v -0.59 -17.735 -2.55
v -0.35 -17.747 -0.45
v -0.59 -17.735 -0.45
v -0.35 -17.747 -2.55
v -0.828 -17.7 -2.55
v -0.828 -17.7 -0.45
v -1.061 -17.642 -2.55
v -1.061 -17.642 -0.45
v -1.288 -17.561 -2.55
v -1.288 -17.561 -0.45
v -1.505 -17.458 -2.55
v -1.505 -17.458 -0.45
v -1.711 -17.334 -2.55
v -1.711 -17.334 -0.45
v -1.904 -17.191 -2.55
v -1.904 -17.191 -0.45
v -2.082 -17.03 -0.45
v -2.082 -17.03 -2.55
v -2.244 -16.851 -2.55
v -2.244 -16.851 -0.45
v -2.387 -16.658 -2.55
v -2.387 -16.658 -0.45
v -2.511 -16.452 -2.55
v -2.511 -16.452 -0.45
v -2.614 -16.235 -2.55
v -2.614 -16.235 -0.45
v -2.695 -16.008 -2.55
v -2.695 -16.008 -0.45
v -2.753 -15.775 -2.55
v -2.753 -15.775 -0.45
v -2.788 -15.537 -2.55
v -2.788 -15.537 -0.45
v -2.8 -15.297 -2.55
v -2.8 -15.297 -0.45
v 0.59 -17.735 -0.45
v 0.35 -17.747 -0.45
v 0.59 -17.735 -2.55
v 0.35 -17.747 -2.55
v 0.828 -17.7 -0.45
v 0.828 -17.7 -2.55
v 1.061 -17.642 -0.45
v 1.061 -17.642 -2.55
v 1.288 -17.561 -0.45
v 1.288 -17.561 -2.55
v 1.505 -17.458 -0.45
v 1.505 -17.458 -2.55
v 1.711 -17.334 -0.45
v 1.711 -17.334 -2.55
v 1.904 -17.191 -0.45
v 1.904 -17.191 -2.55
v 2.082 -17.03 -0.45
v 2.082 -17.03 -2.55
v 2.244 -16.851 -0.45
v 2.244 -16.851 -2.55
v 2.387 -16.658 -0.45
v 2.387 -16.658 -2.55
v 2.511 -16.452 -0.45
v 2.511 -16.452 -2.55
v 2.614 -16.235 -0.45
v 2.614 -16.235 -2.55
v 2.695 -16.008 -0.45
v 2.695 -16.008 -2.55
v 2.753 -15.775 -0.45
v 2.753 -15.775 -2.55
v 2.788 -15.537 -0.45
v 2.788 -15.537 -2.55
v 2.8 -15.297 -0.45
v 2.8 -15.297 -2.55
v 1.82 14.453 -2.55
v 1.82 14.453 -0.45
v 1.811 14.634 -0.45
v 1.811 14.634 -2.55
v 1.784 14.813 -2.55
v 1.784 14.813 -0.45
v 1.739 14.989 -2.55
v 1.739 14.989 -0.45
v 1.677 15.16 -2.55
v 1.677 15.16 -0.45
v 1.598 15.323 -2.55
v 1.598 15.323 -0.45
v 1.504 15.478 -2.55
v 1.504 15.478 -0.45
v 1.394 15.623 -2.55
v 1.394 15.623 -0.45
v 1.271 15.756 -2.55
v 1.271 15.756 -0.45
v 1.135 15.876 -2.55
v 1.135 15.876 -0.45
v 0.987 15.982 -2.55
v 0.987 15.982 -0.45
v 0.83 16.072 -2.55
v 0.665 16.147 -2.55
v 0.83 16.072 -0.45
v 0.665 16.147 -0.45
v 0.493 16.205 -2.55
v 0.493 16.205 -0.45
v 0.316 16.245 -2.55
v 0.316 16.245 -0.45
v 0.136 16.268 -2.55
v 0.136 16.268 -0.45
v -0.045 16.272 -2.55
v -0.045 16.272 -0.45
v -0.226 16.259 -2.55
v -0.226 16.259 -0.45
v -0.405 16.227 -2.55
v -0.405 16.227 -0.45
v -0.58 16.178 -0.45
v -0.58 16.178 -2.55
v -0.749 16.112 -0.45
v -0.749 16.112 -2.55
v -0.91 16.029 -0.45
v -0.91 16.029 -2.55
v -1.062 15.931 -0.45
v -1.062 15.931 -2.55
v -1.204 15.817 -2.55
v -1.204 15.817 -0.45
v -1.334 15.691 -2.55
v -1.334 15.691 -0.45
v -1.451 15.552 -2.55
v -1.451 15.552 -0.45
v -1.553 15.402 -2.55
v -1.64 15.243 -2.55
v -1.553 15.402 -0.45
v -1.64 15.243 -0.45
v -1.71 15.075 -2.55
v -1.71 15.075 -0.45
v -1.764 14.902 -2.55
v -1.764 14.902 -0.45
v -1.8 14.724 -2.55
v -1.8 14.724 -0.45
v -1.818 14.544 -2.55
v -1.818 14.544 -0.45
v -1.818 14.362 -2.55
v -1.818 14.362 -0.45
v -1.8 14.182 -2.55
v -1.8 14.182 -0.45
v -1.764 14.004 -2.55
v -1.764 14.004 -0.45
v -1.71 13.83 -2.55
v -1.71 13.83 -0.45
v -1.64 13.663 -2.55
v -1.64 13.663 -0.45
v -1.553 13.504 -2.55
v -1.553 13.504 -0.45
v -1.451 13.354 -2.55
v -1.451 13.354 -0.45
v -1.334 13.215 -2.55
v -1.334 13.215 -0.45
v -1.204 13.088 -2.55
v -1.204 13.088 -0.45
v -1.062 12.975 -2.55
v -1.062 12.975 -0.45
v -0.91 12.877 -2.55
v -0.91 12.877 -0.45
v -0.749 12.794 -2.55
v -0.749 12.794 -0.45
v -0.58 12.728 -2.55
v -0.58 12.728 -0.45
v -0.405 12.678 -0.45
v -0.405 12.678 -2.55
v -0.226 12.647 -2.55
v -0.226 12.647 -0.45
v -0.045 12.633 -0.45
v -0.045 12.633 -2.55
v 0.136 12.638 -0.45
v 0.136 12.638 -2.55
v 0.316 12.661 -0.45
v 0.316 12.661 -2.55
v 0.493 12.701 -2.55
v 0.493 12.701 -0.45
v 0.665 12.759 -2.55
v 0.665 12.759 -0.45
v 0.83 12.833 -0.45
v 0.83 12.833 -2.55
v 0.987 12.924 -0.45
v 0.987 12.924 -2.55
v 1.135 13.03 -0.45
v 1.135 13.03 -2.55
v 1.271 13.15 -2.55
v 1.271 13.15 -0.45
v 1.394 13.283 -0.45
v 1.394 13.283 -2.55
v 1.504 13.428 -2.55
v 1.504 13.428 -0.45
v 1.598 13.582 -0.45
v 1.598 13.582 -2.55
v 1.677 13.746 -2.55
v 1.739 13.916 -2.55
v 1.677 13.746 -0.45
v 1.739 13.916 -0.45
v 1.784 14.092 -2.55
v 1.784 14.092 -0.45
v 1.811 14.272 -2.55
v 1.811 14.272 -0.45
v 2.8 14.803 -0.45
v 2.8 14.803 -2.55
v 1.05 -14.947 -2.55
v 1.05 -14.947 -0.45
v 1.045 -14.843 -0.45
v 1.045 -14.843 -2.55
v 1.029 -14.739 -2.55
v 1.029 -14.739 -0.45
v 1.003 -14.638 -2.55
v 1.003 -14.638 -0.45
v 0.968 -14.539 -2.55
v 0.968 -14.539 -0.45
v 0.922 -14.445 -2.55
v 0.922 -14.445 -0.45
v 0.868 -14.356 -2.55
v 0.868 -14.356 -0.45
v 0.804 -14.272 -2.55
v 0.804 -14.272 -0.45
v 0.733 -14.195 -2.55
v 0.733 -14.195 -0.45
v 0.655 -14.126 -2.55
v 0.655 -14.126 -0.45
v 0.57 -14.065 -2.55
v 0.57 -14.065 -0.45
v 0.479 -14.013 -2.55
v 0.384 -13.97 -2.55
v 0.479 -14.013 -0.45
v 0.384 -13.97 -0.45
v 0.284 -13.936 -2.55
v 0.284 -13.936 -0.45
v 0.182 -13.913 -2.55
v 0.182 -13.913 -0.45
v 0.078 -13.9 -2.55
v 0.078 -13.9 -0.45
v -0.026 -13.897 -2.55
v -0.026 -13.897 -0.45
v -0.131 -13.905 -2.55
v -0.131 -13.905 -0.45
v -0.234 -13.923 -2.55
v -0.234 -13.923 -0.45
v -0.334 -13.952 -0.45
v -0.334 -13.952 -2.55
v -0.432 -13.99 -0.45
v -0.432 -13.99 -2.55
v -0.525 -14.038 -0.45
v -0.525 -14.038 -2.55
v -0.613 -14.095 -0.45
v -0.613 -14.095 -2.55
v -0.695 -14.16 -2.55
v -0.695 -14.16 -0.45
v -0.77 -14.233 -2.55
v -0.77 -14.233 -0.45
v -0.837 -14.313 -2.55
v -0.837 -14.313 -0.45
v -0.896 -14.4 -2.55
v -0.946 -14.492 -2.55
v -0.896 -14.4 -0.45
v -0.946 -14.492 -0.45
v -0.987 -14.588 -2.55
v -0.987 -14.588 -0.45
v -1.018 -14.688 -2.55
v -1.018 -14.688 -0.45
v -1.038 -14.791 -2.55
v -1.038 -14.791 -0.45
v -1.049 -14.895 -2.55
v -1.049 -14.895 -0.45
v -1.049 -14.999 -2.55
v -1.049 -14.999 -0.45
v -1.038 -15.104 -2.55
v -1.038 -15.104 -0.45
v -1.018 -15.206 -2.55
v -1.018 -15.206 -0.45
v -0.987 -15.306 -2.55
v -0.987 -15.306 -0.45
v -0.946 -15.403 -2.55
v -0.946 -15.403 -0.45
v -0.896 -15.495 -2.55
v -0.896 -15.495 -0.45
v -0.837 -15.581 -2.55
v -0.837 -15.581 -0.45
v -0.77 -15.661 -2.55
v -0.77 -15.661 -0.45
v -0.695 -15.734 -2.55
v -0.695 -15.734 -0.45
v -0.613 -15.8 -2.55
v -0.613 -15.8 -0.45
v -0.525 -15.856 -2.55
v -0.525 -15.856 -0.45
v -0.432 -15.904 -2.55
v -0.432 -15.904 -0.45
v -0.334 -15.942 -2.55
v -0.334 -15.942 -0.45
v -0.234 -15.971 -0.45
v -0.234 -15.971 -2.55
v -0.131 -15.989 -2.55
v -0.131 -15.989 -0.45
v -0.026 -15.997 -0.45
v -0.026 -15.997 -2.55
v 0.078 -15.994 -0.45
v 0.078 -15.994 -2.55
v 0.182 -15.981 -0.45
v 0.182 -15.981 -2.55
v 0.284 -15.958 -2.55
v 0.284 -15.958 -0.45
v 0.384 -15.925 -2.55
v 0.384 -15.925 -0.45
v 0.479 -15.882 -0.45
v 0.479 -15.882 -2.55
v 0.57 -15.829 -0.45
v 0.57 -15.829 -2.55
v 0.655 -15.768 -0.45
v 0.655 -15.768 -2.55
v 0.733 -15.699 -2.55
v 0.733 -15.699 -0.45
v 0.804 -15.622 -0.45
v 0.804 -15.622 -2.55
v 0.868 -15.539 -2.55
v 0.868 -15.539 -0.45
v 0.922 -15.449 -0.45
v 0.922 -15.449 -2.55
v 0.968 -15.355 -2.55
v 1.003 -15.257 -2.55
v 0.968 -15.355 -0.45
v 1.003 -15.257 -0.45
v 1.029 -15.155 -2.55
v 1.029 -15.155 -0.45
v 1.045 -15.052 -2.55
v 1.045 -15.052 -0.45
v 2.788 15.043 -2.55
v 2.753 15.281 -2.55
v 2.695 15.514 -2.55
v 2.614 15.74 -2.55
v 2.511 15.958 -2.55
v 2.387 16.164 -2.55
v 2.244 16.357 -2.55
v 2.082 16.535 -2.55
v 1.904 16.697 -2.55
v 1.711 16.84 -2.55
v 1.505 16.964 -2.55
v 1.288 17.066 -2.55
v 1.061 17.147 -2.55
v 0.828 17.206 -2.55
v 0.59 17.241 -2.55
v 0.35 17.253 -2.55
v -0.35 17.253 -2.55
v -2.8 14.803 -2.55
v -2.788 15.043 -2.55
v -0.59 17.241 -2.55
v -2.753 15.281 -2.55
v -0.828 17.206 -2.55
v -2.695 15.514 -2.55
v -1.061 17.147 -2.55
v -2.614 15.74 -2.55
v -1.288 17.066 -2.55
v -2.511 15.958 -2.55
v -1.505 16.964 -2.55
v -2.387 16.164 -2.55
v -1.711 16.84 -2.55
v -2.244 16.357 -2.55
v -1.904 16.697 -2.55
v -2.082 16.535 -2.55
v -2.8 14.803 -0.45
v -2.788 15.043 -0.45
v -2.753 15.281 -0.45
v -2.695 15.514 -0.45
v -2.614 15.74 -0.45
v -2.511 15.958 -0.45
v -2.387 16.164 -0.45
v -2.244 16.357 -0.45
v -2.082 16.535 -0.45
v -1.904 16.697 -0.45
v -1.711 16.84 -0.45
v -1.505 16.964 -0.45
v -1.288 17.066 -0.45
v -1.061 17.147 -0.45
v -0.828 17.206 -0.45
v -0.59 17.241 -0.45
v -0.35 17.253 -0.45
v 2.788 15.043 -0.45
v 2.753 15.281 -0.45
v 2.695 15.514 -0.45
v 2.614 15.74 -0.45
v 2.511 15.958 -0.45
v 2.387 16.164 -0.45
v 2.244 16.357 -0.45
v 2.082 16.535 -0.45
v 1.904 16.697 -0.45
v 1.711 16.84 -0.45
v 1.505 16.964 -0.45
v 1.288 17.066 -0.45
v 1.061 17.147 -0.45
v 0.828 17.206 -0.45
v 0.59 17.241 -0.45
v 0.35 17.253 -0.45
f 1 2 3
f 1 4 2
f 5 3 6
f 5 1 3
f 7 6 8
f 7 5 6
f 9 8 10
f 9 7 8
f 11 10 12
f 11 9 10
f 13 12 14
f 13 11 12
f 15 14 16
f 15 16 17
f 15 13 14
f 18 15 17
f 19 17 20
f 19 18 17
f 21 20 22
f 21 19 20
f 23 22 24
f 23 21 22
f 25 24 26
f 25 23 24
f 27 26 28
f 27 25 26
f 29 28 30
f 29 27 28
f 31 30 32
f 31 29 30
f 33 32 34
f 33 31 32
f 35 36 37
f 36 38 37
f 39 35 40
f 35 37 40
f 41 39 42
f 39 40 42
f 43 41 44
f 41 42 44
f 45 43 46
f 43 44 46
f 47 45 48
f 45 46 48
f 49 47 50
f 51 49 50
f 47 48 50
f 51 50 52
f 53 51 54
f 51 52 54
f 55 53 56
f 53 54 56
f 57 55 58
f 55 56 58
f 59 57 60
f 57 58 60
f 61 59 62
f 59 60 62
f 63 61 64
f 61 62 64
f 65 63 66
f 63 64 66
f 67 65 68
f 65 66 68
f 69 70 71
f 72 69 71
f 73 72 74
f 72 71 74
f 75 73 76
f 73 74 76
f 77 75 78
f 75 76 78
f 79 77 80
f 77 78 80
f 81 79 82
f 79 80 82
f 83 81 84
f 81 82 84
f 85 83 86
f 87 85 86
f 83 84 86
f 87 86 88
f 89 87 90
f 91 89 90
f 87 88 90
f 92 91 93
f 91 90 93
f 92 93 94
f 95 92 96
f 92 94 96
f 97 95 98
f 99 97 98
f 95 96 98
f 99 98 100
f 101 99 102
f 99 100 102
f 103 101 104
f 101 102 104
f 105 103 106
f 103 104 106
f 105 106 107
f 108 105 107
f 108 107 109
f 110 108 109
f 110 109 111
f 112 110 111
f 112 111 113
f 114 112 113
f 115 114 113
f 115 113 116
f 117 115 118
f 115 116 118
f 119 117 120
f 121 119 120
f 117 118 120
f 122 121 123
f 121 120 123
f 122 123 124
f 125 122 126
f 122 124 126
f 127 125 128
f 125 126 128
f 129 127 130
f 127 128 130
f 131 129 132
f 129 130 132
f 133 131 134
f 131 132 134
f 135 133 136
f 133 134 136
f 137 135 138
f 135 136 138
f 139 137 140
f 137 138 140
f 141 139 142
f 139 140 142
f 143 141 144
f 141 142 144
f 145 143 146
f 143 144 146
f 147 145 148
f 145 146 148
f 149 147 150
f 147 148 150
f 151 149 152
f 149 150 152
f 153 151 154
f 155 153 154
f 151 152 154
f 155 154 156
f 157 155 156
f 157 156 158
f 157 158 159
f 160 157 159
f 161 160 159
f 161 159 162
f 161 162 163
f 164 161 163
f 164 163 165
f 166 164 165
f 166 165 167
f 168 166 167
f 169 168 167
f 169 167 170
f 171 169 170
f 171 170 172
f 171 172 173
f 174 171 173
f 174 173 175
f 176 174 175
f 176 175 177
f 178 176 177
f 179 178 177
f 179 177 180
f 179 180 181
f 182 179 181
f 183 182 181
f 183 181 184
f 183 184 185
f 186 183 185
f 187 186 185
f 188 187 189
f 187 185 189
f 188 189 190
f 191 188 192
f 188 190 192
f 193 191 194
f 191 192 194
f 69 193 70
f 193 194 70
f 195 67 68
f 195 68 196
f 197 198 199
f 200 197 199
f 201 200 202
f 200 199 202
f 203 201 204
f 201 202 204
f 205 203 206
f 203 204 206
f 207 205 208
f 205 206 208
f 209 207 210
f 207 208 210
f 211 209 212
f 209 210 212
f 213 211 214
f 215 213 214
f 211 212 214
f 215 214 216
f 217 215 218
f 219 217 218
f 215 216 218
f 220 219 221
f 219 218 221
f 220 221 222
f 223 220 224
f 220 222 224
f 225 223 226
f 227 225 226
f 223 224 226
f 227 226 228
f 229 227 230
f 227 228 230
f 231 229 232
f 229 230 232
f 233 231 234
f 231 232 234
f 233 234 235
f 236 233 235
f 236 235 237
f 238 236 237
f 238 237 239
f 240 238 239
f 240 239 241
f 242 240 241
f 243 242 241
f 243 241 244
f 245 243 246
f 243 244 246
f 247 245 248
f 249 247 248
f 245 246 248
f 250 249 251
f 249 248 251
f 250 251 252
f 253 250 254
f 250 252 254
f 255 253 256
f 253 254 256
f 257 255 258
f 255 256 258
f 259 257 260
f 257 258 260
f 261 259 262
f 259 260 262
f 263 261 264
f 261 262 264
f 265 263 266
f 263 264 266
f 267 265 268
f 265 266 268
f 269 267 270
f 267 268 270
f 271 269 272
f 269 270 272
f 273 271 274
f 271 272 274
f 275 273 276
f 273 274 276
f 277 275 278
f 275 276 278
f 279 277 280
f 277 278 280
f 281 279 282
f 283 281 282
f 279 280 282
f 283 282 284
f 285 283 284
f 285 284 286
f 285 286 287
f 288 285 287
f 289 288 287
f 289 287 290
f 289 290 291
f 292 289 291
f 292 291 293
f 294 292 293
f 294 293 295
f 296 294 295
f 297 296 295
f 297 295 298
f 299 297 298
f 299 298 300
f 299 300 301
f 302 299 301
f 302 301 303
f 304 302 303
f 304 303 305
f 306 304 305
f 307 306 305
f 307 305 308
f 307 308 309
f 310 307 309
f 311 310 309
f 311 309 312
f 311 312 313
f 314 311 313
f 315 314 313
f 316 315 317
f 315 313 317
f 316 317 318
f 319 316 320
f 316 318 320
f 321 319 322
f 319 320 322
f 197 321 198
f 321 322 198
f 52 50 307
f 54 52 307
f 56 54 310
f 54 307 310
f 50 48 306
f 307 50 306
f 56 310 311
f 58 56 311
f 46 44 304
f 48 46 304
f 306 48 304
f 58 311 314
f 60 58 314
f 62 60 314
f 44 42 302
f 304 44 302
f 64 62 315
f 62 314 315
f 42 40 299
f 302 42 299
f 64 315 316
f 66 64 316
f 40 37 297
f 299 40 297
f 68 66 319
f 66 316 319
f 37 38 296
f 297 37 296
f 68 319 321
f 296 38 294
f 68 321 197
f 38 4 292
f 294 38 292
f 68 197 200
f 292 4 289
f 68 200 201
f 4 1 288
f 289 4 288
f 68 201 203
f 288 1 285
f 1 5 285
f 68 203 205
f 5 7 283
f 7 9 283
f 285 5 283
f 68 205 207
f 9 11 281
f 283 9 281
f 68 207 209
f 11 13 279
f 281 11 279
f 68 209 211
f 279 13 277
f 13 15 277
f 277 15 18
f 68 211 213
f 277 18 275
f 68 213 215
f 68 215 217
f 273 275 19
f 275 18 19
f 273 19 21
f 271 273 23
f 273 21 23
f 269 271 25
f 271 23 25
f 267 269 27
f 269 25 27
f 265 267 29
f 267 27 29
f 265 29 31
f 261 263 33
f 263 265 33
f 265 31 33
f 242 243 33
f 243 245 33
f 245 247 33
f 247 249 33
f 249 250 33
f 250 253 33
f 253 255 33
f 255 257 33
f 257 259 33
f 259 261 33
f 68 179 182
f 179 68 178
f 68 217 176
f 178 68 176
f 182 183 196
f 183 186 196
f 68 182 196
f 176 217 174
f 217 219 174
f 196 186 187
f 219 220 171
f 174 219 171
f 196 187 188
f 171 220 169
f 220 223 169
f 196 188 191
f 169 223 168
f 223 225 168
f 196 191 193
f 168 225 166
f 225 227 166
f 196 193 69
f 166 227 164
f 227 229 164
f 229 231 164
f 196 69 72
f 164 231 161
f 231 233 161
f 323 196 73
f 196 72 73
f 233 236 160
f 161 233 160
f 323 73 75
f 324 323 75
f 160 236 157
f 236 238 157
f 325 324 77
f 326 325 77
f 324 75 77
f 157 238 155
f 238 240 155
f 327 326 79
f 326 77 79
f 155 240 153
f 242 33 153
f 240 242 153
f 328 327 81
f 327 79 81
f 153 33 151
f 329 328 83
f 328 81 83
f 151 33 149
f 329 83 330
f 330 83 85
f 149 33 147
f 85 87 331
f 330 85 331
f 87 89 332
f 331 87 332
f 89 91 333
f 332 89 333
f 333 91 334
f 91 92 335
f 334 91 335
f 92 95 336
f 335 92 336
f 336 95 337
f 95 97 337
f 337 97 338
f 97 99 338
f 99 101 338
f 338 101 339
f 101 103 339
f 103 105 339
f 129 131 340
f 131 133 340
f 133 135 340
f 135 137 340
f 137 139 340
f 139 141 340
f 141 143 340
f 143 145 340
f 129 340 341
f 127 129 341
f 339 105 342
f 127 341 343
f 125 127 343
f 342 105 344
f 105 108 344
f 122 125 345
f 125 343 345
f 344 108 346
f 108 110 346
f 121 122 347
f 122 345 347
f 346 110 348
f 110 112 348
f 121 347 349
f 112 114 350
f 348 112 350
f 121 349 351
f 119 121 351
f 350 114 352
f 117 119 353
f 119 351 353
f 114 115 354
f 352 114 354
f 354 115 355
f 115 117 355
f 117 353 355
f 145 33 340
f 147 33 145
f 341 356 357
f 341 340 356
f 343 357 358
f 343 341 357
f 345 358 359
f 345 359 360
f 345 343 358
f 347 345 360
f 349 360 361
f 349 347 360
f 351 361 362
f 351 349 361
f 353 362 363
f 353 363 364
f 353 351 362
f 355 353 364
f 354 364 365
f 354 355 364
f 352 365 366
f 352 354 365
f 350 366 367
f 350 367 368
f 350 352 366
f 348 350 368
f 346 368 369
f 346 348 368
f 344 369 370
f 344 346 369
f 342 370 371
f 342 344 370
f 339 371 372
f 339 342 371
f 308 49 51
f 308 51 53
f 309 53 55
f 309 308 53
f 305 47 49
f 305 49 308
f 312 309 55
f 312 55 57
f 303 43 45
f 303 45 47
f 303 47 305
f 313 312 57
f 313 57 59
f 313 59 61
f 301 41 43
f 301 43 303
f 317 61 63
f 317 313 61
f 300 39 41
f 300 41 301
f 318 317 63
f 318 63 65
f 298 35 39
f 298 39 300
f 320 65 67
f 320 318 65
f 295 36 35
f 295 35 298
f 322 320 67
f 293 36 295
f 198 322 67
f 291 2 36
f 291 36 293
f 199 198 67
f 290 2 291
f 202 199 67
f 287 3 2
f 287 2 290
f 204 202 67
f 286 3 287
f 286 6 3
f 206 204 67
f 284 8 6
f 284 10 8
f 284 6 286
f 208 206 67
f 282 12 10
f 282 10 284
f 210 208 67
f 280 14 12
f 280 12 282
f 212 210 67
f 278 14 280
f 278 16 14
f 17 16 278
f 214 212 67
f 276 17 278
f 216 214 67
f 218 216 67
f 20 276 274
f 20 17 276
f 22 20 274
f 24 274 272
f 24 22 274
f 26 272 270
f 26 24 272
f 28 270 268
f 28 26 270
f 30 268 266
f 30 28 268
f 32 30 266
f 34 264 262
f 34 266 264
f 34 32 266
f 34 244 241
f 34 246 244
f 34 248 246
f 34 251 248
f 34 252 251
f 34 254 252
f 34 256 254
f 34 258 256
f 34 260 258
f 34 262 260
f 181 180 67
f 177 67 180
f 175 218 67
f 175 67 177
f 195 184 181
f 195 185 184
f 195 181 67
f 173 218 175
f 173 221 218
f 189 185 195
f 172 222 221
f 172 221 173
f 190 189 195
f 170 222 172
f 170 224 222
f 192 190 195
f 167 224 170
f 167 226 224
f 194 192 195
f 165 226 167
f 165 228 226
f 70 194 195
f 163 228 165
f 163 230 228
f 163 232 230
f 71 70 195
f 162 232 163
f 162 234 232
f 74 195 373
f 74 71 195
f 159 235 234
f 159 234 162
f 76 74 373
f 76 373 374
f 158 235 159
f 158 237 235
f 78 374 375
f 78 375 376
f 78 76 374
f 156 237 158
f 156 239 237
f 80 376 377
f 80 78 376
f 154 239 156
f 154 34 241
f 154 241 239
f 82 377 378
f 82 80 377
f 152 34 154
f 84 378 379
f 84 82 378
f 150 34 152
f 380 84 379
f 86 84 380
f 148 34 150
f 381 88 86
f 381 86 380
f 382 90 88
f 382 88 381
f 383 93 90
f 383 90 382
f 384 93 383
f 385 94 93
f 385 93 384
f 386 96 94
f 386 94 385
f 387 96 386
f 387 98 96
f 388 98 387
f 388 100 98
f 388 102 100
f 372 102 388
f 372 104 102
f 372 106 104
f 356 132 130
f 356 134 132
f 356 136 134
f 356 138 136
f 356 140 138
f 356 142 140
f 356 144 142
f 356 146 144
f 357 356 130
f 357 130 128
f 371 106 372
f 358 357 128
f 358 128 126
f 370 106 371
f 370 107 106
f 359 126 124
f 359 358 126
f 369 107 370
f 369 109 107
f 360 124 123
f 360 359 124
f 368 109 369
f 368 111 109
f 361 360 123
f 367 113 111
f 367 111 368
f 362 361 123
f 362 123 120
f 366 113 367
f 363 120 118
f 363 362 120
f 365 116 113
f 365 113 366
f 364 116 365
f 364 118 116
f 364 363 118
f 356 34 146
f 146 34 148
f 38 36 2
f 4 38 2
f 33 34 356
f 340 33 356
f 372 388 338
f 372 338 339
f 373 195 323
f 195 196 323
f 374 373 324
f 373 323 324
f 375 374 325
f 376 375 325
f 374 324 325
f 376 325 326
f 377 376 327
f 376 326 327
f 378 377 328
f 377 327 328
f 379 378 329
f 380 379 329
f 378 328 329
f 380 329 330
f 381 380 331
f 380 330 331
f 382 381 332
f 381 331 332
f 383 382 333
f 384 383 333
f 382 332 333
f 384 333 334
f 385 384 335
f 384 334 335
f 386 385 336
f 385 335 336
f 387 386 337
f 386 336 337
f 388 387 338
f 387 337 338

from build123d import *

# Parameters (mm, degrees)
SKETCH1_W           = 50
SKETCH1_H           = 8
SKETCH1_R           = 1.5
SKETCH1_R_2         = 2.6
BOSS_EXTRUDE1_DEPTH = 3
FILLET1_R           = 3.5
SCALE1_SCALE        = 0.7


with BuildPart() as part:
    # Sketch1 → Boss-Extrude1 (new body)
    with BuildSketch(Plane(origin=(0, 0, 0), x_dir=(0, 1, 0), z_dir=(0, 0, 1))):
        Rectangle(SKETCH1_W, SKETCH1_H)
        with Locations(Location((-21, 0, 0), (0, 0, 270))):
            Circle(SKETCH1_R, mode=Mode.SUBTRACT)
        with Locations(Location((21, 0, 0), (0, 0, 270))):
            Circle(SKETCH1_R_2, mode=Mode.SUBTRACT)
    extrude(amount=-BOSS_EXTRUDE1_DEPTH)

    # Fillet1
    fillet1_edges = [part.edges().sort_by_distance(p)[0] for p in [
        (4, 25, -1.5),
        (4, -25, -1.5),
        (-4, -25, -1.5),
        (-4, 25, -1.5),
    ]]
    fillet(fillet1_edges, radius=FILLET1_R)


with BuildPart() as part_1:
    # Scale1: scaled about (0, -0.82380326, -1.5)
    add(part.part.scale(SCALE1_SCALE).moved(Location((0, -0.247140978, -0.45))))


solid = part_1.part
